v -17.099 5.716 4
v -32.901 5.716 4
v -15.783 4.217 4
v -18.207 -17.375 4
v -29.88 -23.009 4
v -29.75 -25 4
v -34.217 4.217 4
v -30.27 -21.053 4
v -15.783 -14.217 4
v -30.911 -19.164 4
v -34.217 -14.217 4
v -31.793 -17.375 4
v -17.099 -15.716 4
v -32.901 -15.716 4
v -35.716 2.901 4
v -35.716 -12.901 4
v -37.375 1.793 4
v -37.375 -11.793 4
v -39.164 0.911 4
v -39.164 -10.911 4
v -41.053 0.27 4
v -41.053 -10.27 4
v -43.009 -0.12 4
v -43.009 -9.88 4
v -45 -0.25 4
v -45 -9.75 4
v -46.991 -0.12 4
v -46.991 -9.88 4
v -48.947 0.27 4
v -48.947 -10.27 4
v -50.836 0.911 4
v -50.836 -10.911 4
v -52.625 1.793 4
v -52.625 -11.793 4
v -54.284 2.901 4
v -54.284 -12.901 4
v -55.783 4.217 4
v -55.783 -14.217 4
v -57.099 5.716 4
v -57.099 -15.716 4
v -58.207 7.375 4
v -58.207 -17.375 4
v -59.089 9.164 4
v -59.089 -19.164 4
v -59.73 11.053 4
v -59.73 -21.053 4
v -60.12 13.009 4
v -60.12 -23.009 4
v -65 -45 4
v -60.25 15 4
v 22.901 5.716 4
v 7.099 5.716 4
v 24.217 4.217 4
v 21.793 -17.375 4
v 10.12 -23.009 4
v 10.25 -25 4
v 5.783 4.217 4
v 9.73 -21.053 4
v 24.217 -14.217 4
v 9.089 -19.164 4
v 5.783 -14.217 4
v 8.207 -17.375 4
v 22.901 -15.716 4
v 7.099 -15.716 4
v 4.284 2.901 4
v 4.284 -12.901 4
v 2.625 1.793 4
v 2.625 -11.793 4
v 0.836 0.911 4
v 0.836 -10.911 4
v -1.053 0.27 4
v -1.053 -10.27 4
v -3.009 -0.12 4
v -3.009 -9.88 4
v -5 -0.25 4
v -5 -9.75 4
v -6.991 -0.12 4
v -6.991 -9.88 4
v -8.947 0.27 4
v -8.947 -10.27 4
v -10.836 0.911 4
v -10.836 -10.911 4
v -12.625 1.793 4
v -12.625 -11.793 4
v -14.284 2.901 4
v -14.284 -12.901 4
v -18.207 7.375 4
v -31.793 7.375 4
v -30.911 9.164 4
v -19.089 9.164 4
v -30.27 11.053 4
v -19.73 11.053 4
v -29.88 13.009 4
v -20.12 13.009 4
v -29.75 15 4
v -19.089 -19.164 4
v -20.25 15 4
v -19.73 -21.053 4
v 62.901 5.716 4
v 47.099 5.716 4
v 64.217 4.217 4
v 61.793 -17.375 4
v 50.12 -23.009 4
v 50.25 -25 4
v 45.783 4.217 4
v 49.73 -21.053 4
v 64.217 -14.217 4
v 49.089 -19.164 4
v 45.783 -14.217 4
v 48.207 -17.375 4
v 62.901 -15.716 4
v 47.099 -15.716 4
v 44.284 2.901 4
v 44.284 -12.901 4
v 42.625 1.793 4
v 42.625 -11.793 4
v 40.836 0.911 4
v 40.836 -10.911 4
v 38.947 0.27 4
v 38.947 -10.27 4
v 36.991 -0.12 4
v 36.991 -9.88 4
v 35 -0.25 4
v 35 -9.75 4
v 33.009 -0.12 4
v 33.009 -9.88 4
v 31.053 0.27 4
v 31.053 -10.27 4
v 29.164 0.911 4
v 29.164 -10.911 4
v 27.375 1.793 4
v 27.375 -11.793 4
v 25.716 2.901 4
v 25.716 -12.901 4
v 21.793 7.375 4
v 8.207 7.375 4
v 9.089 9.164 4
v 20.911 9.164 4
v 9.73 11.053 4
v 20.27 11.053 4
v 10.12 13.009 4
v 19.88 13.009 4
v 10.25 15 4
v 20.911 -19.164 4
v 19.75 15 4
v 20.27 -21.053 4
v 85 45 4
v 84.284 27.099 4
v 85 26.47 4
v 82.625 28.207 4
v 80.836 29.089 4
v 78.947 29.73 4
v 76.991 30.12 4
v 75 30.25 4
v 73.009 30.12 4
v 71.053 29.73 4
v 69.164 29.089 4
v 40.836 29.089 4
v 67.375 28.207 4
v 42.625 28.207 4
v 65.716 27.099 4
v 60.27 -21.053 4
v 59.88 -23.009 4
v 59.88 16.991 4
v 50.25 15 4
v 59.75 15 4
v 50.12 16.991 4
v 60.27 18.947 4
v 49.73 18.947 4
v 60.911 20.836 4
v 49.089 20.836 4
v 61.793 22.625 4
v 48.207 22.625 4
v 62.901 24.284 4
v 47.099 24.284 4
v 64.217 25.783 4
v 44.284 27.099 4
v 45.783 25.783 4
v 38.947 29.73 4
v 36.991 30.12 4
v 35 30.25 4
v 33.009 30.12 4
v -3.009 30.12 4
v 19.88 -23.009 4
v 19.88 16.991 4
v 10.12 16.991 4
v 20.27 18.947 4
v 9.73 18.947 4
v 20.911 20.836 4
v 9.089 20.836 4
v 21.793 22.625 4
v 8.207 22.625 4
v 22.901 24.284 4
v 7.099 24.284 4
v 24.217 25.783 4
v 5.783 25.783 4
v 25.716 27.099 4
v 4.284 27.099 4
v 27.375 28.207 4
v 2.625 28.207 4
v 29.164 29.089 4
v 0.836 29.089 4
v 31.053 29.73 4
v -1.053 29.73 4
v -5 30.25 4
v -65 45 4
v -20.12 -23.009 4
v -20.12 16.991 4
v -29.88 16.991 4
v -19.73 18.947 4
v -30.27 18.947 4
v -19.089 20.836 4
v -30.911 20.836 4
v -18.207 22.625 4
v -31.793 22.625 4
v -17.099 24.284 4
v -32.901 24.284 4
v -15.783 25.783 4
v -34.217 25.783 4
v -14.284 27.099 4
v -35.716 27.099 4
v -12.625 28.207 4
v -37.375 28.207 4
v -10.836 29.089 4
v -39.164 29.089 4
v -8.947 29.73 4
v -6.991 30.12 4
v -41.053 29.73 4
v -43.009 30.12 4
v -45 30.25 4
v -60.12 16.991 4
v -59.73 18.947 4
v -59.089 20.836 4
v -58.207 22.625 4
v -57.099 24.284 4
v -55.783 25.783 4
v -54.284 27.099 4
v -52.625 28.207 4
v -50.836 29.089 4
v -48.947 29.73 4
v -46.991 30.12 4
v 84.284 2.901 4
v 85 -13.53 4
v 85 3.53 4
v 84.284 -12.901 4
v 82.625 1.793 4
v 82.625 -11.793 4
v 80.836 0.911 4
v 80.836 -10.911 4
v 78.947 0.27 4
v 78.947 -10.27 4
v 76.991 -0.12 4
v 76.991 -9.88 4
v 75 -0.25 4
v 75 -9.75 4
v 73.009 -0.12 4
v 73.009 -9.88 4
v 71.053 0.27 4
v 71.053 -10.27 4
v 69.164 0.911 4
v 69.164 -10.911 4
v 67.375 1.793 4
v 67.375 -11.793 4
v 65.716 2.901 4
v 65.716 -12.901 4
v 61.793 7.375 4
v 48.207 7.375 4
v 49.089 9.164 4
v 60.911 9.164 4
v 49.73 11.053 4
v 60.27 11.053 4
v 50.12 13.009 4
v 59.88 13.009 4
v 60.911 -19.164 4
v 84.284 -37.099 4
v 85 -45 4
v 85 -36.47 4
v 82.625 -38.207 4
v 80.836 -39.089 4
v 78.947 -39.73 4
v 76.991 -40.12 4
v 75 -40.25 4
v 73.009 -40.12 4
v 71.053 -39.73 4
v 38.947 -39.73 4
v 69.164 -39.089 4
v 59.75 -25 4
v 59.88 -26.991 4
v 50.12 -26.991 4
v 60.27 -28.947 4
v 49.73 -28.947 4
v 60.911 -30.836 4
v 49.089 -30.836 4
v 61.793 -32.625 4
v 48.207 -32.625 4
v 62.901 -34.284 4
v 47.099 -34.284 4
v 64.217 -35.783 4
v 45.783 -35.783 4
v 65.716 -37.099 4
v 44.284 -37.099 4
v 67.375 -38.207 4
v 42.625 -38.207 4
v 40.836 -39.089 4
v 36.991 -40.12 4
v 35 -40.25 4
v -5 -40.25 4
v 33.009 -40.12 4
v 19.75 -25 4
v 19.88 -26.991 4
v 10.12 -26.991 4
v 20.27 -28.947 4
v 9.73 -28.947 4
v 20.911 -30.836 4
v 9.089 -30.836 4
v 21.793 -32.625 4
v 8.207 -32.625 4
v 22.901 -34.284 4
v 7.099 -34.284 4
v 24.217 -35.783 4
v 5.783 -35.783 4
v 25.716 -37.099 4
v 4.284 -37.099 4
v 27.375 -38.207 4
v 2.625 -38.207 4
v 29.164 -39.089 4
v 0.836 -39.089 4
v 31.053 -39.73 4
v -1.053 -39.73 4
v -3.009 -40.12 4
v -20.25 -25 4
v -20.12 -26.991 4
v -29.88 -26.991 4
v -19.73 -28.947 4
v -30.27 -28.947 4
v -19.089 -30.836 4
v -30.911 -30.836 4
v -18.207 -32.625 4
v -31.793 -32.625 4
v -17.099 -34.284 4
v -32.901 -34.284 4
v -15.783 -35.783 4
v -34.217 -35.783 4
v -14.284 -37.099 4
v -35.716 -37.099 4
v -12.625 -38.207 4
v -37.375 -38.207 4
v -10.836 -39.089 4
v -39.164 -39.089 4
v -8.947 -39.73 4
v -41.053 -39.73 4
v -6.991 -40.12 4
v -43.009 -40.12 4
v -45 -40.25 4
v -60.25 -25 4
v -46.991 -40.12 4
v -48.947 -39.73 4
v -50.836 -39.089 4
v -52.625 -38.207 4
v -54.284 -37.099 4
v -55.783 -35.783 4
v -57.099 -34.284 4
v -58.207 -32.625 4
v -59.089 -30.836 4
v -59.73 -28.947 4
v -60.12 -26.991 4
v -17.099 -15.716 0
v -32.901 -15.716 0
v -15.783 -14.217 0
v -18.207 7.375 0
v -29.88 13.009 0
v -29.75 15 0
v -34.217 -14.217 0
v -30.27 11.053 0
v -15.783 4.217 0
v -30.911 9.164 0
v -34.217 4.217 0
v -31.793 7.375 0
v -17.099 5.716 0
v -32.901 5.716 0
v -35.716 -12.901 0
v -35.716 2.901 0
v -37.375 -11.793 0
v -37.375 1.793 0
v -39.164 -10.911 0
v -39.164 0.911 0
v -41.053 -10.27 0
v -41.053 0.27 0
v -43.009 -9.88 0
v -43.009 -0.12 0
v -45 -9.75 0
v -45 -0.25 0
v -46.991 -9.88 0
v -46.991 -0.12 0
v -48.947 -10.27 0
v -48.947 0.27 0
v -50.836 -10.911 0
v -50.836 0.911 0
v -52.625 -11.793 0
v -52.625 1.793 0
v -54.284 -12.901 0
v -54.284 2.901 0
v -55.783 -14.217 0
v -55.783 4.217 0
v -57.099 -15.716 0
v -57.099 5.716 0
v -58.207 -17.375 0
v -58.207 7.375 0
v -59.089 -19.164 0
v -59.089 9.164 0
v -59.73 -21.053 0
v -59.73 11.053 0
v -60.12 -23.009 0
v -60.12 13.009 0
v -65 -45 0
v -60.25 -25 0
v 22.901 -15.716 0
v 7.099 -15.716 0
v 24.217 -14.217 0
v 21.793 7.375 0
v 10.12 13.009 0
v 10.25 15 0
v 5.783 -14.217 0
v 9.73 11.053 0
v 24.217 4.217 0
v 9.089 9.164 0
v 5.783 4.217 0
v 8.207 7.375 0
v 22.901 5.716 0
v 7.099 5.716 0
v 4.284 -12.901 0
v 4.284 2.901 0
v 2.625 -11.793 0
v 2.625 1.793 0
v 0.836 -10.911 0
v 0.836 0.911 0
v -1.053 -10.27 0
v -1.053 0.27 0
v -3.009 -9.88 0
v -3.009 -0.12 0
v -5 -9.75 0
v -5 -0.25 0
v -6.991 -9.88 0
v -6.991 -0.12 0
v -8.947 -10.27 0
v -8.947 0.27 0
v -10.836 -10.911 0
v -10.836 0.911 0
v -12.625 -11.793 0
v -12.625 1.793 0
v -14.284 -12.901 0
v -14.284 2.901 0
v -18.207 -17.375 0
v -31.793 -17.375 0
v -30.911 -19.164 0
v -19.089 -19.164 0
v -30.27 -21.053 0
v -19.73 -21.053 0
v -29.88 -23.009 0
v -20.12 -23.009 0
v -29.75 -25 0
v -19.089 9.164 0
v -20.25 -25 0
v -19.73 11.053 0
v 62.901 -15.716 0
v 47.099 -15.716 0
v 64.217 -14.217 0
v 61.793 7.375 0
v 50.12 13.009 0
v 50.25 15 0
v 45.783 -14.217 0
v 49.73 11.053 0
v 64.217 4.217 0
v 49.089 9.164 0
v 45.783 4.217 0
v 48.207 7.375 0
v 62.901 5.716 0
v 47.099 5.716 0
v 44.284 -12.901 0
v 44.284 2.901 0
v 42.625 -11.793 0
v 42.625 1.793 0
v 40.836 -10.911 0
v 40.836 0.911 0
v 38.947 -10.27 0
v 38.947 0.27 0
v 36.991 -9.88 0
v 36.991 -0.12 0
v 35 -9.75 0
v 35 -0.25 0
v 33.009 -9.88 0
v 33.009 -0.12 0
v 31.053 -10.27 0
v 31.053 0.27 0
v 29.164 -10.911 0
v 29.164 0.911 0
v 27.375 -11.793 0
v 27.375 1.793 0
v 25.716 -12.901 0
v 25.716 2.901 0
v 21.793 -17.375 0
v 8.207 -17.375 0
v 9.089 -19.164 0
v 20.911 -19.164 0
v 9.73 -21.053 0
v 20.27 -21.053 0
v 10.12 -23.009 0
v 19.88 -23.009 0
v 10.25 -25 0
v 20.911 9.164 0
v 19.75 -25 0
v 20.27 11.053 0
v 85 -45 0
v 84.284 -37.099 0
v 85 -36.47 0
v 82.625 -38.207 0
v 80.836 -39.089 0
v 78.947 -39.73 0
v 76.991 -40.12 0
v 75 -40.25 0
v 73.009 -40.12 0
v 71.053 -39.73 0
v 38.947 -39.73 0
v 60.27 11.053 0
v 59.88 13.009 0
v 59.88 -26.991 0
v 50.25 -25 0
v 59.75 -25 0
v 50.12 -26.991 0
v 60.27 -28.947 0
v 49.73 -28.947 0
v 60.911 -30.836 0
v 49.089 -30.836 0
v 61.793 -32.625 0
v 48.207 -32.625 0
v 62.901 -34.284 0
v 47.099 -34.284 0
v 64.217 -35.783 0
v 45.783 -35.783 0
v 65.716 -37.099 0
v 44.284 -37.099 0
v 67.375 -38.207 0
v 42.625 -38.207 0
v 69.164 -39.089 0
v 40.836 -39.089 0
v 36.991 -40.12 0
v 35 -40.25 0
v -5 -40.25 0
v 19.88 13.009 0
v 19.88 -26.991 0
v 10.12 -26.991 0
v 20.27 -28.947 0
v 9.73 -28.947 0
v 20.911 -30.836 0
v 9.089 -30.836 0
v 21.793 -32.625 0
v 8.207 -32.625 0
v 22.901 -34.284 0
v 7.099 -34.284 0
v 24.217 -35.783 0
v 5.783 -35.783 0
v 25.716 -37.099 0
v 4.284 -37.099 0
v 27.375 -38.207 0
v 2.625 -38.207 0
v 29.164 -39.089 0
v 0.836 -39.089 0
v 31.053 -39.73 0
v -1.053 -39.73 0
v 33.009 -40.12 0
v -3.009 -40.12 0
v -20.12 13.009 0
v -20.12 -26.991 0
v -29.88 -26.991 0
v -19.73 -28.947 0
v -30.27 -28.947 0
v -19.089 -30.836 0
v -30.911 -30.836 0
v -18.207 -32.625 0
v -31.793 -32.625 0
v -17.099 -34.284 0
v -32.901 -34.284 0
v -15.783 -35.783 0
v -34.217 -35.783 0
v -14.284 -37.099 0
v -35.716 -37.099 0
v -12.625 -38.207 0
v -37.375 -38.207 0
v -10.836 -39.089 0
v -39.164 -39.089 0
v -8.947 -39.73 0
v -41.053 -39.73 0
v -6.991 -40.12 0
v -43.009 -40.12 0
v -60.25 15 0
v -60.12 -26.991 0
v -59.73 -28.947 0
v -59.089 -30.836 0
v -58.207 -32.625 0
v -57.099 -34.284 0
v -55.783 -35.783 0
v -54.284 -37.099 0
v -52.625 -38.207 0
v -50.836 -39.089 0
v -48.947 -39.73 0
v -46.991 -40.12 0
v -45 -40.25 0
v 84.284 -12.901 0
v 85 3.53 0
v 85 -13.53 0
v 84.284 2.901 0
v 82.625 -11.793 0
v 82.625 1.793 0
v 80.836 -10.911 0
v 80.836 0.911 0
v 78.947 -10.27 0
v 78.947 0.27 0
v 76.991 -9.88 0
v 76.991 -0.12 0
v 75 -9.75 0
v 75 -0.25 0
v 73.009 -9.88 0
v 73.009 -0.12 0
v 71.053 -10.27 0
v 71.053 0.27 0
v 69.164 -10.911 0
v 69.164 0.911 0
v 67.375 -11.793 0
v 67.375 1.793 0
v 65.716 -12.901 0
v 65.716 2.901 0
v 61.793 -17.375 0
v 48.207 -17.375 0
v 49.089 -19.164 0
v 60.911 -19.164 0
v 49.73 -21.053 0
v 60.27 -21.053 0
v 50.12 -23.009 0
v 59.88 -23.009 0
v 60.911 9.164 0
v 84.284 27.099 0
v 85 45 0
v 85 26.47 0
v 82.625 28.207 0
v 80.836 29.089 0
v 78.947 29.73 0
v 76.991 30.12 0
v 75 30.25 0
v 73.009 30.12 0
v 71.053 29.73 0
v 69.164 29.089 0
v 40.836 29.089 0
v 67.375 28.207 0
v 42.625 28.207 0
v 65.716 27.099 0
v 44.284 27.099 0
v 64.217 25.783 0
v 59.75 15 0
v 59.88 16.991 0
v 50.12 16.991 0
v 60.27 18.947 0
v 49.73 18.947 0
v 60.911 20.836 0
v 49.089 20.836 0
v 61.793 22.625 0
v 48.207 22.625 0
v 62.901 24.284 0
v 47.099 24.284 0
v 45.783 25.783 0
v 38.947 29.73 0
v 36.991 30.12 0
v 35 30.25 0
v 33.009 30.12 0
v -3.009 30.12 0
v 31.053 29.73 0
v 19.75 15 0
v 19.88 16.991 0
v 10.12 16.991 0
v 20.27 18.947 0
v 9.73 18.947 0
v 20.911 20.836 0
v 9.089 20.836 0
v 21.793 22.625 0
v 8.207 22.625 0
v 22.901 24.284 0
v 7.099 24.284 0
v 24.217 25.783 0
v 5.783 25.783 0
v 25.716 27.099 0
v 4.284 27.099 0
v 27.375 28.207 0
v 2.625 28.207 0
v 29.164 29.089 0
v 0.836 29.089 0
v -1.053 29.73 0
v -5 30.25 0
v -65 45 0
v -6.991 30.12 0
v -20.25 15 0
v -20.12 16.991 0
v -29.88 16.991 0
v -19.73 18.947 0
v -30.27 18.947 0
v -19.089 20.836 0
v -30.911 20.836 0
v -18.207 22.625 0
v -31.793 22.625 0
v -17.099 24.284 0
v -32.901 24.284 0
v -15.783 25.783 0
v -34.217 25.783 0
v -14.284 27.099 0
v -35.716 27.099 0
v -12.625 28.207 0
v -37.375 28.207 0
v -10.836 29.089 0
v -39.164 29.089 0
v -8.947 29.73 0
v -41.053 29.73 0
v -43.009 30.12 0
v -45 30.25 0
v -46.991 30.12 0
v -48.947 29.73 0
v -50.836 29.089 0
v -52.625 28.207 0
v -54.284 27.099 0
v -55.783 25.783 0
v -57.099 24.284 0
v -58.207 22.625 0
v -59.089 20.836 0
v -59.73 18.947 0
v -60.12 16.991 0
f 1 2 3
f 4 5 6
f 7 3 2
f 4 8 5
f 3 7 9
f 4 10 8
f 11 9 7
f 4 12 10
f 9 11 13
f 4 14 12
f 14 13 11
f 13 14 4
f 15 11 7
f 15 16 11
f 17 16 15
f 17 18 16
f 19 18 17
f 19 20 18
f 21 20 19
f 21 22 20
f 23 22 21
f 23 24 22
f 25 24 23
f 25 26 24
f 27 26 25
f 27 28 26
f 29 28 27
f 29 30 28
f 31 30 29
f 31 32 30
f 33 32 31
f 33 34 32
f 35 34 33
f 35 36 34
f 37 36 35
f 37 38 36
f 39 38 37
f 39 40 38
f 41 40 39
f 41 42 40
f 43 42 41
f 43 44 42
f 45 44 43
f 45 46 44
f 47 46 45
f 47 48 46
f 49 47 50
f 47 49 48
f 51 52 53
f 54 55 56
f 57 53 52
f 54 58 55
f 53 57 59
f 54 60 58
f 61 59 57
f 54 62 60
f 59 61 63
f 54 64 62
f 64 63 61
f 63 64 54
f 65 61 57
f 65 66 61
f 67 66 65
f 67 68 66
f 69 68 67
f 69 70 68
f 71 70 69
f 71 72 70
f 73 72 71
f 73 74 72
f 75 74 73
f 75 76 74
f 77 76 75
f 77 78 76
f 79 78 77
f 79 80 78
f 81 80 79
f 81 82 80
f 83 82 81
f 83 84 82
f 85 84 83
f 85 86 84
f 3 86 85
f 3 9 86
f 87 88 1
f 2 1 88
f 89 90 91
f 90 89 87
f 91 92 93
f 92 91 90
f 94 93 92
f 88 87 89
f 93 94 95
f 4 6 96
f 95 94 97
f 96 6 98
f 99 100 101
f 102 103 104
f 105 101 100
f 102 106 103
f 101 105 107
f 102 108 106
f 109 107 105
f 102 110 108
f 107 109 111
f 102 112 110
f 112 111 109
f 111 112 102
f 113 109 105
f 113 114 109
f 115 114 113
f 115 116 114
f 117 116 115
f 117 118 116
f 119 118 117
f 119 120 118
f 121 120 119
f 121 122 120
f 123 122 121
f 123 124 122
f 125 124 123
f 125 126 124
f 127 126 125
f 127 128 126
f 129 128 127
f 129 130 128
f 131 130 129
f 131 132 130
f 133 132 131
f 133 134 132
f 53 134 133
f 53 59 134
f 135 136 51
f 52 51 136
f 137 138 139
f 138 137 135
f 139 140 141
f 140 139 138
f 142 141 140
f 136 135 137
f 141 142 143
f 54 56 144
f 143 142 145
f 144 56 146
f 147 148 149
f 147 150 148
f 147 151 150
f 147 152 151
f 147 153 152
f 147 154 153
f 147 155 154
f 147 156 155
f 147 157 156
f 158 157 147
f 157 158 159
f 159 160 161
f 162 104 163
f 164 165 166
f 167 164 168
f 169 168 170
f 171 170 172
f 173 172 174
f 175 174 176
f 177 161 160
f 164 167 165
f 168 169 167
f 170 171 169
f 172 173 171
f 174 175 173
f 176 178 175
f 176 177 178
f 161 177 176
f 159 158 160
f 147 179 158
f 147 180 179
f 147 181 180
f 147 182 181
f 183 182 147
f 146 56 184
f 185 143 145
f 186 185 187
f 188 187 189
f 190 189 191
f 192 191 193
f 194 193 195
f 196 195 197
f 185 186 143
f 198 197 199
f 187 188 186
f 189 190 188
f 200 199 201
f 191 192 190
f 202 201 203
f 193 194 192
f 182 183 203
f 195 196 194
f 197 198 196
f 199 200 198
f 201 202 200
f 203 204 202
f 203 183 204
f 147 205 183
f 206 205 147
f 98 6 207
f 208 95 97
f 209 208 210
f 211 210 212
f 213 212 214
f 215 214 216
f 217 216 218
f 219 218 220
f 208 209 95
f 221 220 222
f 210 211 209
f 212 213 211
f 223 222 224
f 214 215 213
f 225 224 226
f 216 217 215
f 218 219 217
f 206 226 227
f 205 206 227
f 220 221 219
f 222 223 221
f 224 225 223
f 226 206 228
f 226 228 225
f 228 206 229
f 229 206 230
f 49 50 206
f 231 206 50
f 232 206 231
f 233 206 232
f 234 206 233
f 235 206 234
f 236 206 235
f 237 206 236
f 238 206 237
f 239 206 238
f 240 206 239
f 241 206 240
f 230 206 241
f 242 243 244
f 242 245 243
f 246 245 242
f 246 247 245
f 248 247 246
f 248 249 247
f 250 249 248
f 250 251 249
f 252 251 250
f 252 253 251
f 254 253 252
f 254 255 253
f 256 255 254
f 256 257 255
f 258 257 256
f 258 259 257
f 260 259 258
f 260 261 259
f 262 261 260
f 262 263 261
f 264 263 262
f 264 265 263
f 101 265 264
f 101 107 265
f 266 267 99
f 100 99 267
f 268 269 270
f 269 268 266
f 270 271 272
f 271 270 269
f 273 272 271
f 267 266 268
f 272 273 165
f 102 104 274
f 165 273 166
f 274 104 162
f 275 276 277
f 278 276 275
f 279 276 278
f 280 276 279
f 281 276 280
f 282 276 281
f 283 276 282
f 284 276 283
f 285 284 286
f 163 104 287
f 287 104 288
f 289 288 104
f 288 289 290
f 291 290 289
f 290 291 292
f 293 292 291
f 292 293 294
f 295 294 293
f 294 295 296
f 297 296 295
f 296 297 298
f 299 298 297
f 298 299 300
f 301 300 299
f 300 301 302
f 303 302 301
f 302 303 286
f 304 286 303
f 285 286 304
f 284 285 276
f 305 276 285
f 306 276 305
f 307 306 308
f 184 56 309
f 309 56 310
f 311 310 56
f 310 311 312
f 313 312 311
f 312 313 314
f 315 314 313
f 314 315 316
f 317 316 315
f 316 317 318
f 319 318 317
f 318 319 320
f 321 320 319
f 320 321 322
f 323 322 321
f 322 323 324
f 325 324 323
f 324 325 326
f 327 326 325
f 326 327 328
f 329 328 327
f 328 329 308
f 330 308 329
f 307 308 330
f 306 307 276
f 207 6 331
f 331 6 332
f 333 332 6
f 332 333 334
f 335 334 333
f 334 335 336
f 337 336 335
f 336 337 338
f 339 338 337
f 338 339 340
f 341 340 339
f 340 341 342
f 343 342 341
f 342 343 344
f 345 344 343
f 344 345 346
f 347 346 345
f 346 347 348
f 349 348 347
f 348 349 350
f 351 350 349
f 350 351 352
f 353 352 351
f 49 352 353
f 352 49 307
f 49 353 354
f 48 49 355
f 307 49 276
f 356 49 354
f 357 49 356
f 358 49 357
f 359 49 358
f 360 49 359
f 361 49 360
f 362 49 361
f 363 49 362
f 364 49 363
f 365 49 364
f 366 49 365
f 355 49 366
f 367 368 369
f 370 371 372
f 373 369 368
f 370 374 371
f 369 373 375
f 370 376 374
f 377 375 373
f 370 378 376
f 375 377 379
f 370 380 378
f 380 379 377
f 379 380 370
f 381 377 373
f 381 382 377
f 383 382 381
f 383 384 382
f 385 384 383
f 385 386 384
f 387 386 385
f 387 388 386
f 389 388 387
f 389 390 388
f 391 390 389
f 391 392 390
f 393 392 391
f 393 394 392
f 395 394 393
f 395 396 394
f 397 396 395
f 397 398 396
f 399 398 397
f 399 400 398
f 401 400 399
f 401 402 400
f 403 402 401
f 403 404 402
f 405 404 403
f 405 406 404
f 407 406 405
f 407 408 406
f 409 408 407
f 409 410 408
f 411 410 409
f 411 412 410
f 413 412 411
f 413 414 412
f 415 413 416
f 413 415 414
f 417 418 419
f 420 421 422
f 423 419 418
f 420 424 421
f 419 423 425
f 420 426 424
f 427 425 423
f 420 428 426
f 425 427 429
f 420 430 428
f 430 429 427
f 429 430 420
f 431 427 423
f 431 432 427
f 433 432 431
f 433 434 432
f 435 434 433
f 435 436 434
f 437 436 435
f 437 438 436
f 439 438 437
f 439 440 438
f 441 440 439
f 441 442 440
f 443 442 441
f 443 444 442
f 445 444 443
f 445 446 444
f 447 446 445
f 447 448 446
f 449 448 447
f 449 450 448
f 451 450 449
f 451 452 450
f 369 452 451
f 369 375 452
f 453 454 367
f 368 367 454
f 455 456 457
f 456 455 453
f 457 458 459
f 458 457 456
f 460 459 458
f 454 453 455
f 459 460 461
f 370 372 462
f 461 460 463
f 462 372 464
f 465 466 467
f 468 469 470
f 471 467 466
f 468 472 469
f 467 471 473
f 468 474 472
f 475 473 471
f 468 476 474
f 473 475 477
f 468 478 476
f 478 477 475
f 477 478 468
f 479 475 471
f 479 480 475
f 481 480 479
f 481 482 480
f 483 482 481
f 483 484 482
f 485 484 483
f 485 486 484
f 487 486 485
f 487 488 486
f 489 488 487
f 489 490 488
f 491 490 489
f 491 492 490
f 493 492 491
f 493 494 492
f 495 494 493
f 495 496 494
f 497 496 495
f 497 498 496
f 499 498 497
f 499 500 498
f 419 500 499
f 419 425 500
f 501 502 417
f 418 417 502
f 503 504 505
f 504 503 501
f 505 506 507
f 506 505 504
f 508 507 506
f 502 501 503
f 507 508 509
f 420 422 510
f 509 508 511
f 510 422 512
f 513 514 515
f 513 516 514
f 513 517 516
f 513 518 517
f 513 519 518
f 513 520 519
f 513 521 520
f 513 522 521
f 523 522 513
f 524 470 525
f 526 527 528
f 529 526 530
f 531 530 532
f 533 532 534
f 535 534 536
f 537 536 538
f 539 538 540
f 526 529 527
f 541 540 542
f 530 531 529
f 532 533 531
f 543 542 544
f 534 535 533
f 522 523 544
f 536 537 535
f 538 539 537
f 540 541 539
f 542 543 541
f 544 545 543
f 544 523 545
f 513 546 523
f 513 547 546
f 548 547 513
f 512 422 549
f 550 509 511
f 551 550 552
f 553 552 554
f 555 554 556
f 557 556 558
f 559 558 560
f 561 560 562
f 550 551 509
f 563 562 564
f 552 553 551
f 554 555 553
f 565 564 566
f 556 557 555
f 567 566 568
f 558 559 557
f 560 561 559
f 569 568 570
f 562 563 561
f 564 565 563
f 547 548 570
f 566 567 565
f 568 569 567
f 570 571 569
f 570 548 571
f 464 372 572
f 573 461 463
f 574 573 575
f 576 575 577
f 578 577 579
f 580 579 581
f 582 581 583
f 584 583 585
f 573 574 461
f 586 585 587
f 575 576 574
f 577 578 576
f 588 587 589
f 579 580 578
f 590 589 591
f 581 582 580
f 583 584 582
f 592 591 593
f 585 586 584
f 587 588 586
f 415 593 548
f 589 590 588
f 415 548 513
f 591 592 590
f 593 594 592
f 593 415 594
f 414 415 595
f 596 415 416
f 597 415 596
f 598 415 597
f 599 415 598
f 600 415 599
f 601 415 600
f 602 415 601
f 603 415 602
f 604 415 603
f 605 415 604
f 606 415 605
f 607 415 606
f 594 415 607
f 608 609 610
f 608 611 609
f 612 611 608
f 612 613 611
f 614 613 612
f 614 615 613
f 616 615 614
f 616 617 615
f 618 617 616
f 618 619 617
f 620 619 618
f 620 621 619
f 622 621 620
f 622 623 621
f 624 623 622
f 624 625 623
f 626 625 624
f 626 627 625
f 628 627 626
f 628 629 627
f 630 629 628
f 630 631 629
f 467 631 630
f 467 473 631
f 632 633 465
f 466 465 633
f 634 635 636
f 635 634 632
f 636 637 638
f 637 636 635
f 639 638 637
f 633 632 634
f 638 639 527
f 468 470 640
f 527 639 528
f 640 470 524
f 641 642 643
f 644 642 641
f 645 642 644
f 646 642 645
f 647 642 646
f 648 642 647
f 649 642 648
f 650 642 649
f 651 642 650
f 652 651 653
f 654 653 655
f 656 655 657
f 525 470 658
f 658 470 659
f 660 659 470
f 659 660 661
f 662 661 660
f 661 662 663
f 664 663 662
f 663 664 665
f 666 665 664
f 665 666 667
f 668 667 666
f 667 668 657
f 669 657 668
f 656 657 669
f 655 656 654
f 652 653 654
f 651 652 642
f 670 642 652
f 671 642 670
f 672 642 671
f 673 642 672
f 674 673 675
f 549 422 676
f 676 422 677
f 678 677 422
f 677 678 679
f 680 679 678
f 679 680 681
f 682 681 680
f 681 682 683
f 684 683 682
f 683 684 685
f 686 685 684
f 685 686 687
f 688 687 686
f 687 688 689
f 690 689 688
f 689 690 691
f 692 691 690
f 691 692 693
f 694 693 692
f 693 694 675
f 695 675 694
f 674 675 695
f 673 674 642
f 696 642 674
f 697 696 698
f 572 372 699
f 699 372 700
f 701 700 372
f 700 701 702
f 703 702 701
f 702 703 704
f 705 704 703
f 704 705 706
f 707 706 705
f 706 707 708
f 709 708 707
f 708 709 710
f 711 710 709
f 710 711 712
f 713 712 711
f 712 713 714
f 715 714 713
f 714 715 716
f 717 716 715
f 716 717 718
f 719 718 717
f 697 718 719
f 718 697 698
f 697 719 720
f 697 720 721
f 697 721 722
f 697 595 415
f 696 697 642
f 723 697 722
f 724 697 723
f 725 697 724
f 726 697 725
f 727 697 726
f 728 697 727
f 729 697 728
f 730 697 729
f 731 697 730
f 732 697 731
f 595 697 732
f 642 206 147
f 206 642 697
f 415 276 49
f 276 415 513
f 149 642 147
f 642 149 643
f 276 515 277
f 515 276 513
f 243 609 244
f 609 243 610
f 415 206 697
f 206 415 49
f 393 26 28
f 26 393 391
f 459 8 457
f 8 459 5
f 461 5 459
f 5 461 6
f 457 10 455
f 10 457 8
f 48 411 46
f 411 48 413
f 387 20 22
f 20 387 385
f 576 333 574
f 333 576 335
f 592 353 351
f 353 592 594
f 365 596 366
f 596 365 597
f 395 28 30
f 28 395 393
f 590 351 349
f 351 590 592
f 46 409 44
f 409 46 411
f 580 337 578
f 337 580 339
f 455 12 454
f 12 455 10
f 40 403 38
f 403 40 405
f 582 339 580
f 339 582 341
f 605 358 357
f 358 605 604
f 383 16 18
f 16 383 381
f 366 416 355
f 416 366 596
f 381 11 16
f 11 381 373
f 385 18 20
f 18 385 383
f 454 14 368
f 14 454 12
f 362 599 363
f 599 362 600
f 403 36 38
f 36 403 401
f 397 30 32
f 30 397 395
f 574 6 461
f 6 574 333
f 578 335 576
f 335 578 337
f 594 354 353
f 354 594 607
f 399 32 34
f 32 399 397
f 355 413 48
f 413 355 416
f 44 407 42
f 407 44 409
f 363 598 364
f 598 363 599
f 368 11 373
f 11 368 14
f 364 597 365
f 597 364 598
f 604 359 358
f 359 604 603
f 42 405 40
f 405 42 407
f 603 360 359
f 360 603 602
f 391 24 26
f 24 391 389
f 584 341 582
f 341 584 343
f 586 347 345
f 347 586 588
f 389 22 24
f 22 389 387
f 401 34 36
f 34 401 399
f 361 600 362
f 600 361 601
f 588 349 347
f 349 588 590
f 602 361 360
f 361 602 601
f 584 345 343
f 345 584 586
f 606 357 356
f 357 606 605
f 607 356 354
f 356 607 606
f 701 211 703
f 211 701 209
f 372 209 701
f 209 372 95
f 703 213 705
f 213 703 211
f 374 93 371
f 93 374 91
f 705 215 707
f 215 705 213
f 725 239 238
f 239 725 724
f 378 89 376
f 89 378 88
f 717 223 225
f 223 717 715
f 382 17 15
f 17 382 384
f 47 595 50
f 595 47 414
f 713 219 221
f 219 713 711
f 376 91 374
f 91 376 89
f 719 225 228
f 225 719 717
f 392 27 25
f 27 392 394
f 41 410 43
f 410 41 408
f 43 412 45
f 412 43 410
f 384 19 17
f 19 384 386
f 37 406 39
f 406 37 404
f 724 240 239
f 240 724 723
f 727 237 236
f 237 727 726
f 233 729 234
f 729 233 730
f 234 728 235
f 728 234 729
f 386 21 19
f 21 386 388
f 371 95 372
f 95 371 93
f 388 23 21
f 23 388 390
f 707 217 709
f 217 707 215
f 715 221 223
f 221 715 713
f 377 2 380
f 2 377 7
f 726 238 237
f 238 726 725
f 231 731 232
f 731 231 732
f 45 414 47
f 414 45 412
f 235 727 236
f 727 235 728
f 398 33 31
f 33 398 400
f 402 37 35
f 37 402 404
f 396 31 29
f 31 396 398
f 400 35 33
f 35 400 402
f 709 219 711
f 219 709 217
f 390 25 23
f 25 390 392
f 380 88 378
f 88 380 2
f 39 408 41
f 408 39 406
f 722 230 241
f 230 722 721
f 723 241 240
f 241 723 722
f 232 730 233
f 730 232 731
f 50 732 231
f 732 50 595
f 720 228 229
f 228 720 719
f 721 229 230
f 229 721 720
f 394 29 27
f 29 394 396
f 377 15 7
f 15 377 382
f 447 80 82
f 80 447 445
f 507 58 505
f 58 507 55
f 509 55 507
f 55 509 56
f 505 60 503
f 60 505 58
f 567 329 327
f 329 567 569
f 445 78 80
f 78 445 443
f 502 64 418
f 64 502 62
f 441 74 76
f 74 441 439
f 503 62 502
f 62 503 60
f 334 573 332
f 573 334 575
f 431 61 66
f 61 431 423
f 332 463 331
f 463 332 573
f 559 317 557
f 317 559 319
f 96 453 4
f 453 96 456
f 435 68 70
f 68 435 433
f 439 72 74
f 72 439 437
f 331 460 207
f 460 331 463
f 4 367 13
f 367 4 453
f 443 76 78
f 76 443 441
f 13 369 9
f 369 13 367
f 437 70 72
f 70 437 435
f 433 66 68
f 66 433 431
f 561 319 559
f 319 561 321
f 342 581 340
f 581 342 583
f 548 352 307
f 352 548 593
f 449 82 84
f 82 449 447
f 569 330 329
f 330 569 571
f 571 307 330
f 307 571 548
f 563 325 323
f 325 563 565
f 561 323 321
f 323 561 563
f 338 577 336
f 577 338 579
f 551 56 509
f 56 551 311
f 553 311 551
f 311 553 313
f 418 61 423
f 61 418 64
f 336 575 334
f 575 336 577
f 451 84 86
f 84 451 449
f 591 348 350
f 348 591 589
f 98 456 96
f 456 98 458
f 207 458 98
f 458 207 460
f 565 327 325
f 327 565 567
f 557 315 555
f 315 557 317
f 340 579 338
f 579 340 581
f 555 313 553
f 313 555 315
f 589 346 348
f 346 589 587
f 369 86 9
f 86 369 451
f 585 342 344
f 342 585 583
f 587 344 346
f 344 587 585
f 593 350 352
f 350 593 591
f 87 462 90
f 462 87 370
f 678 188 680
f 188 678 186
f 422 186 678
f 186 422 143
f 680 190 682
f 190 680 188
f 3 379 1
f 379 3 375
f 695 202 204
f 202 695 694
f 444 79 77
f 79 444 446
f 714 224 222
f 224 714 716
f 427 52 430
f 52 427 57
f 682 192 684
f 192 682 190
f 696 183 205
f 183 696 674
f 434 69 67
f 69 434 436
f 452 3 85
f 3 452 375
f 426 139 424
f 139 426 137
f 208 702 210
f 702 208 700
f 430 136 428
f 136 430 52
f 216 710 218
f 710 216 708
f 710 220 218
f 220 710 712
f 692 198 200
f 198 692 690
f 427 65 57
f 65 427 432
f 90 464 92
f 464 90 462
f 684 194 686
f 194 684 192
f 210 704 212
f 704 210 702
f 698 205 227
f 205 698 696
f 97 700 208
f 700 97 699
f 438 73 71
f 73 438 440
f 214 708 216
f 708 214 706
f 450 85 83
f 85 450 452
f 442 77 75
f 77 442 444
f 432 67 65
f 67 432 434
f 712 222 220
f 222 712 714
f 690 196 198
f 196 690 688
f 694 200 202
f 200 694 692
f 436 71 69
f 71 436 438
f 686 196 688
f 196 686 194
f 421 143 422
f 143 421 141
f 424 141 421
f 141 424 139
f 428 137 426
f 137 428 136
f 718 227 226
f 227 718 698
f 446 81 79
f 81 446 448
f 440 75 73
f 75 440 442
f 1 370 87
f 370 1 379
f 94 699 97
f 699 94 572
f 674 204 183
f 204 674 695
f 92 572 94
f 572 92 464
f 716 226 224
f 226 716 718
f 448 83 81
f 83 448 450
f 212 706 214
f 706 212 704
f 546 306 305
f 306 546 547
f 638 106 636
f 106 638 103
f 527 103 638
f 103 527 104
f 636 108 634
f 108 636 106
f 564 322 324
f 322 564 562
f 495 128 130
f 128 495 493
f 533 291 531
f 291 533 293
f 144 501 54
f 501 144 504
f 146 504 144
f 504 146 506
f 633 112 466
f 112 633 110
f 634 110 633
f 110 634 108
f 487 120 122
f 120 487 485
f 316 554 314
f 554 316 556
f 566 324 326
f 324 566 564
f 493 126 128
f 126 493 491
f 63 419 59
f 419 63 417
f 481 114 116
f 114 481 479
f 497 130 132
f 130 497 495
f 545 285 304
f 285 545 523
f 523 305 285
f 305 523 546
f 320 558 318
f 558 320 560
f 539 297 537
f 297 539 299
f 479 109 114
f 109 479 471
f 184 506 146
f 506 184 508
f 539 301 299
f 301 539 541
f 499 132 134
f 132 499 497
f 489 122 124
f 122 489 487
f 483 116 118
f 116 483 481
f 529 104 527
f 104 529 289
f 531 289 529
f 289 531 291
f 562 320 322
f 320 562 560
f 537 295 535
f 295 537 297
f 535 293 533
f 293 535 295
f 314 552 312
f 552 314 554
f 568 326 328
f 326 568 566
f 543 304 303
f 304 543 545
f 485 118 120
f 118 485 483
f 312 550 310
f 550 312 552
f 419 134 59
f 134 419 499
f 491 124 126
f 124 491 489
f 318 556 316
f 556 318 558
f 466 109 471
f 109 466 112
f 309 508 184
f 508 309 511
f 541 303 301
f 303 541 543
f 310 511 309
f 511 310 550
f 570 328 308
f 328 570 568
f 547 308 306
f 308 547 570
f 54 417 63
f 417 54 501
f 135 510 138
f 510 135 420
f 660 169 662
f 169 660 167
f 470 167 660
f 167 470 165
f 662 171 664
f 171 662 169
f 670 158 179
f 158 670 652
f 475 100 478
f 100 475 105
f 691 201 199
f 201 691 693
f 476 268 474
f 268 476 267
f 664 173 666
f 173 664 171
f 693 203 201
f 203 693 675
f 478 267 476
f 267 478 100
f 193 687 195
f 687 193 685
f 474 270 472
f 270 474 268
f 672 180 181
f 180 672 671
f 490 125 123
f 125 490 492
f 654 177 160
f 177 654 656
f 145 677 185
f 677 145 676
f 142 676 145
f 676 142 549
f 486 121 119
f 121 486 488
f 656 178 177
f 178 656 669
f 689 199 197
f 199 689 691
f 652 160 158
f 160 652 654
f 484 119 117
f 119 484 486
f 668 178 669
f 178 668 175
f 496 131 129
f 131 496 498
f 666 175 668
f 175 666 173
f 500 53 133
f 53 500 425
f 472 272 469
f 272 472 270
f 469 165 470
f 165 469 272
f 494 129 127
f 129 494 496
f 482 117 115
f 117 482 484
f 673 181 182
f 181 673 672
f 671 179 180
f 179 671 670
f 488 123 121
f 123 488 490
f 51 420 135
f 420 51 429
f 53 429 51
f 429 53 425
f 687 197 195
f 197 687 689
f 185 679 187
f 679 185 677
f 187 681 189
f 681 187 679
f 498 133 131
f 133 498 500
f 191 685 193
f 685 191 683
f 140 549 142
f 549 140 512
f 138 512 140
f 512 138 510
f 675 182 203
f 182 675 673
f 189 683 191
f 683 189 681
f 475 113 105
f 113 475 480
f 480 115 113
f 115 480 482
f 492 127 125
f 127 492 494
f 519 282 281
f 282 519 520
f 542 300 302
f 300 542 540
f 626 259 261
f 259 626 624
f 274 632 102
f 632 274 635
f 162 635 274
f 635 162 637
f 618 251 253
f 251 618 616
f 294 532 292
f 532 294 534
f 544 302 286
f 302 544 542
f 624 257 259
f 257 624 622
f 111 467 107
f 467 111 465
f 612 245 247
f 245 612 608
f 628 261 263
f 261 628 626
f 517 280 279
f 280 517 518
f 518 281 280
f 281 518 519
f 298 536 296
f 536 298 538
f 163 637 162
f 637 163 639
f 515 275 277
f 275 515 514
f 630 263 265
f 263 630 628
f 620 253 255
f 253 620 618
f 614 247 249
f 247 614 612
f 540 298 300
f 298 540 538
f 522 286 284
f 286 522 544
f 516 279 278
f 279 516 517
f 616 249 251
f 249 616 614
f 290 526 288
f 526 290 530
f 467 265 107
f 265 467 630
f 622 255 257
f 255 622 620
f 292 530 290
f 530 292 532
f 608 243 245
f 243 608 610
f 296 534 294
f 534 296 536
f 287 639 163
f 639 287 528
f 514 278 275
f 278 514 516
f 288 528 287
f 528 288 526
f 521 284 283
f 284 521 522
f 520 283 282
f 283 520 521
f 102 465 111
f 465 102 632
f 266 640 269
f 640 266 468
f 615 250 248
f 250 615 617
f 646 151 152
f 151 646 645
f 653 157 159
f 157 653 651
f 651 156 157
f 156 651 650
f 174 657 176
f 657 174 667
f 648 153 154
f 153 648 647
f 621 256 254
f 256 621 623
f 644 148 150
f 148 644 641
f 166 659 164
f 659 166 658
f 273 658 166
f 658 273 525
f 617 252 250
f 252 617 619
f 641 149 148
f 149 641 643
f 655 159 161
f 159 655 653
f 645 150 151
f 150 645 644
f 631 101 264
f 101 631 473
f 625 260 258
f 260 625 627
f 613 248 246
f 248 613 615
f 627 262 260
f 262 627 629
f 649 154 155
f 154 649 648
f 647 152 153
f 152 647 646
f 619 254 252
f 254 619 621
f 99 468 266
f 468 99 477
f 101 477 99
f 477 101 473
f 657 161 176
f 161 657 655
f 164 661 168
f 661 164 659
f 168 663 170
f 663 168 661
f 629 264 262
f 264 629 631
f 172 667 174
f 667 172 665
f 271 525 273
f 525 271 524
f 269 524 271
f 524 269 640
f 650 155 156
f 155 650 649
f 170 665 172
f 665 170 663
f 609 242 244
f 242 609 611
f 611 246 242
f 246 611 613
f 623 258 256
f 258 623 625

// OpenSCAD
// Tube rack - a flat plate with a regular grid of tube holes and two solid walls along the
// long edges. Printed upside down and flipped over, it stands on the two walls with the
// tubes passing through the holes. NOVEL general part.
//

cols   = 6;
pitch_x = 40;
pitch_y = 40;
L      = 130;
W      = 90;
t      = 4;
h      = 70;
d      = 30.5;

$fn = 48;

plate_t = 4;

difference() {
    union() {
        translate([-L / 2, -W / 2, 0]) cube([L, W, plate_t]);                                          // plate
        for (x = [-L / 2 + pitch_x / 2, L / 2 - pitch_x / 2])
            translate([x, -W / 2, 0]) cube([pitch_x, W, plate_t]);                                     // edge walls
    }
    for (i = [0 : cols - 1], j = [0 : 1])
        translate([ -L / 2 + pitch_x / 2 + i * pitch_x,
                    -W / 2 + pitch_y / 2 + j * pitch_y,
                    -1 ])
            cylinder(h = plate_t + 2, d = d);
}
